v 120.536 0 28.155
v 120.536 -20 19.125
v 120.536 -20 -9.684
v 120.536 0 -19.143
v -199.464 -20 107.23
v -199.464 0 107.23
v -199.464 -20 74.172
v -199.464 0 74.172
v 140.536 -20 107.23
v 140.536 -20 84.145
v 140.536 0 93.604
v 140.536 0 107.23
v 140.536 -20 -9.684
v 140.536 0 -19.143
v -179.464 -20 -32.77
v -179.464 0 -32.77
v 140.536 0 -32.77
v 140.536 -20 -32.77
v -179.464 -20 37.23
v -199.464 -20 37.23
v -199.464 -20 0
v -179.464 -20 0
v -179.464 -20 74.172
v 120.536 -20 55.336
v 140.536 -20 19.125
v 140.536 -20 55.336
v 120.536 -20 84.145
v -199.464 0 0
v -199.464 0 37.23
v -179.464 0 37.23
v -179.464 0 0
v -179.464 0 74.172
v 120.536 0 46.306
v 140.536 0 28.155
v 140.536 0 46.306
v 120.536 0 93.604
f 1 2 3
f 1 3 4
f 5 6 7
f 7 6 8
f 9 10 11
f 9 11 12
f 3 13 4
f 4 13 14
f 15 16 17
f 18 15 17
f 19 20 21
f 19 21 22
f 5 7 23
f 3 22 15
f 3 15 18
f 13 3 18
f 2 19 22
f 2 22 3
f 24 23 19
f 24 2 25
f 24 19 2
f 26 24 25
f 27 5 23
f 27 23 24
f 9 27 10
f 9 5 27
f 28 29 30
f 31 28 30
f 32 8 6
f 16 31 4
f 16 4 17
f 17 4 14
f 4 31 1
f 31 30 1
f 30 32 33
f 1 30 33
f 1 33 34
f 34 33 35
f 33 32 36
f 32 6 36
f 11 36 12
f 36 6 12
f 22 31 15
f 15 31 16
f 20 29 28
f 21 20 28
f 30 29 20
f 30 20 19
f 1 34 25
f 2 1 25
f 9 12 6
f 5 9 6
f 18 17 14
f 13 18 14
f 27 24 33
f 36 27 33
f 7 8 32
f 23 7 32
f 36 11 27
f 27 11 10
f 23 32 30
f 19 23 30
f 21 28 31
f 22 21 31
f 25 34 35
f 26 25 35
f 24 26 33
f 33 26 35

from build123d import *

# Parameters (mm, degrees)
F0_W     = 20
F0_H     = 18.615236
F0_H_2   = 18.615237
F1_DEPTH = 20
F3_DEPTH = 20


with BuildPart() as f1:
    # F0 (on Front) → F1 (new body)
    with BuildSketch(Plane.XZ):
        Polygon((-179.463843, 107.230473), (-199.463843, 107.230473), (-199.463843, 74.172214), (-179.463843, 74.172214), (-179.463843, 37.230473), (-179.463843, 18.615237), (-179.463843, 0), (-179.463843, -32.769527), (140.536157, -32.769527), (140.536157, 107.230473), align=None)
        with Locations((-189.463843, 27.922855)):
            Rectangle(F0_W, F0_H)
        with Locations((-189.463843, 9.307619)):
            Rectangle(F0_W, F0_H_2)
    extrude(amount=F1_DEPTH)

    # F2 (on face) → F3 (cut)
    with BuildSketch(Plane.YZ.offset(140.536157)):
        Polygon((-20, 84.144631), (-20, 55.335836), (0, 46.306214), (0, 93.604238), align=None)
        Polygon((0, 28.154733), (-20, 19.125111), (-20, -9.683684), (0, -19.143291), align=None)
    extrude(amount=-F3_DEPTH, mode=Mode.SUBTRACT)


solid = f1.part
